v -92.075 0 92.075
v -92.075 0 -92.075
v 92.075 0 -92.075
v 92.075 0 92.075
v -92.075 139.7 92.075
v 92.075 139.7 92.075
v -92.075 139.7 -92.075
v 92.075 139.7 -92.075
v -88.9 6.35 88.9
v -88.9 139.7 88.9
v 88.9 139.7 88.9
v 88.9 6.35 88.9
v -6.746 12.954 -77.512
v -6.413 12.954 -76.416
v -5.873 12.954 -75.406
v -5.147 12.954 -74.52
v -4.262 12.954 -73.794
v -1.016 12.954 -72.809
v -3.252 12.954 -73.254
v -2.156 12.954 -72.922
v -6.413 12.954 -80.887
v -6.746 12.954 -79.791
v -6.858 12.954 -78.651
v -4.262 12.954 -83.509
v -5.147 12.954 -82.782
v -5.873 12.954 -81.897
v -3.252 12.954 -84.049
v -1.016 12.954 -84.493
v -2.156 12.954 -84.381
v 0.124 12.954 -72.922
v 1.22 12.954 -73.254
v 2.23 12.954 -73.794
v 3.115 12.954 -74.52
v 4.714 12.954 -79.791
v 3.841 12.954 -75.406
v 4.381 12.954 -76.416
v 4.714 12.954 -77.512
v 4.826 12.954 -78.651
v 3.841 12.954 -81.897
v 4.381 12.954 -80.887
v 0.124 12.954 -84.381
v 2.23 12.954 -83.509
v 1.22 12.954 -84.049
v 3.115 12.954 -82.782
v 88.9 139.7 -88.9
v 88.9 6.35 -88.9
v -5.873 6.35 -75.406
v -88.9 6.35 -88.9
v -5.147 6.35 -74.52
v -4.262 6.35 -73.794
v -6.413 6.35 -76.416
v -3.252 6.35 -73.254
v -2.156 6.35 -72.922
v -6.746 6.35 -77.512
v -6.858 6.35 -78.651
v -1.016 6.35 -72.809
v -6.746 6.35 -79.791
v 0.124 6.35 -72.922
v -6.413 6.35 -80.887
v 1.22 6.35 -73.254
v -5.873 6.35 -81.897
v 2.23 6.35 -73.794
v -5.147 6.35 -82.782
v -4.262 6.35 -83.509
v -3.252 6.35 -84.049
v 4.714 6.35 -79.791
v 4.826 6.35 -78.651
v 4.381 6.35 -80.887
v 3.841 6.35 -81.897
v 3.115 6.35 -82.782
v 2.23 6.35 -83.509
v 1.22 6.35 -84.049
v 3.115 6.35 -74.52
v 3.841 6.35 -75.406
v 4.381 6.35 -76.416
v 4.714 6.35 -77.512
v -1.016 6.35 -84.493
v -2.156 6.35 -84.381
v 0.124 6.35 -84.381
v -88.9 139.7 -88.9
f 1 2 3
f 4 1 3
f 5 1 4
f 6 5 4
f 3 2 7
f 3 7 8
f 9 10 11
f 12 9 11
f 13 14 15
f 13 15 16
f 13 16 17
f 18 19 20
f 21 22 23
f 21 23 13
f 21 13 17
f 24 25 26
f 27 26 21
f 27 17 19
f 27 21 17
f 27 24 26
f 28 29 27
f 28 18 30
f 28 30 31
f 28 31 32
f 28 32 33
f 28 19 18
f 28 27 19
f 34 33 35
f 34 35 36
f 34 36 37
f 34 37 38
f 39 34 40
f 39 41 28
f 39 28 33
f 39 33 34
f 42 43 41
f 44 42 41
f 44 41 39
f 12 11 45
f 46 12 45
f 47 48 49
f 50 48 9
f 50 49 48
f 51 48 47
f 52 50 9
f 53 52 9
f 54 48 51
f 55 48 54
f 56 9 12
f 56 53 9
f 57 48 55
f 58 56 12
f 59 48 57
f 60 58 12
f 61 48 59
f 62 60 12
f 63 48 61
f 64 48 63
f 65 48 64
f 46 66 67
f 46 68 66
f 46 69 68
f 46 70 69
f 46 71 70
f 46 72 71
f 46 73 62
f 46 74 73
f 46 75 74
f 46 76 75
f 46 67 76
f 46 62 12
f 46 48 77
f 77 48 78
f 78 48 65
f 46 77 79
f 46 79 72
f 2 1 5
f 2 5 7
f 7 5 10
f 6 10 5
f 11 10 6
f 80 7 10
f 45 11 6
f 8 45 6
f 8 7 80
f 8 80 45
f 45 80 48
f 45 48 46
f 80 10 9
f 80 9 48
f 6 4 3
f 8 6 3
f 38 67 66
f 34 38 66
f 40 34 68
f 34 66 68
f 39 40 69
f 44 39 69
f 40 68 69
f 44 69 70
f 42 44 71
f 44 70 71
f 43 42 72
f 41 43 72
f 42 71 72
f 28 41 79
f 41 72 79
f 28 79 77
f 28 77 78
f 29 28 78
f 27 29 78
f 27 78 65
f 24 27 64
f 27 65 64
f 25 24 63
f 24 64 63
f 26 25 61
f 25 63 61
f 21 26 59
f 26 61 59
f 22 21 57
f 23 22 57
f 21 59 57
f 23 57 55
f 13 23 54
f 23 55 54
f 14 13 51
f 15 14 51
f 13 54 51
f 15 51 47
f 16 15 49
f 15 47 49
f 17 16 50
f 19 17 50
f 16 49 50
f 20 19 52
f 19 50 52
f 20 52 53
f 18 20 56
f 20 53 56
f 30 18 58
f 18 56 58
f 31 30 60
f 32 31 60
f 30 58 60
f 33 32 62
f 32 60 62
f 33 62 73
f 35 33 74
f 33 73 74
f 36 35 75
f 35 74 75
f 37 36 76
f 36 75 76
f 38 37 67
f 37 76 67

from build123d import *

# Parameters (mm, degrees)
SKETCH1_W           = 184.15
SKETCH1_H           = 184.15
BOSS_EXTRUDE1_DEPTH = 139.7
SKETCH2_W           = 177.8
SKETCH2_H           = 177.8
CUT_EXTRUDE1_DEPTH  = 133.35
SKETCH3_R           = 5.842
BOSS_EXTRUDE2_DEPTH = 6.604


with BuildPart() as part:
    # Sketch1 → Boss-Extrude1 (new body)
    with BuildSketch(Plane(origin=(0, 0, 0), x_dir=(1, 0, 0), z_dir=(0, 1, 0))):
        Rectangle(SKETCH1_W, SKETCH1_H)
    extrude(amount=BOSS_EXTRUDE1_DEPTH)

    # Sketch2 → Cut-Extrude1 (cut)
    with BuildSketch(Plane(origin=(0, 139.7, 0), x_dir=(1, 0, 0), z_dir=(0, 1, 0))):
        Rectangle(SKETCH2_W, SKETCH2_H)
    extrude(amount=-CUT_EXTRUDE1_DEPTH, mode=Mode.SUBTRACT)

    # Sketch3 → Boss-Extrude2 (add)
    with BuildSketch(Plane(origin=(0, 6.35, 0), x_dir=(1, 0, 0), z_dir=(0, 1, 0))):
        with Locations((-1.016, 78.651394374)):
            Circle(SKETCH3_R)
    extrude(amount=BOSS_EXTRUDE2_DEPTH)


solid = part.part
